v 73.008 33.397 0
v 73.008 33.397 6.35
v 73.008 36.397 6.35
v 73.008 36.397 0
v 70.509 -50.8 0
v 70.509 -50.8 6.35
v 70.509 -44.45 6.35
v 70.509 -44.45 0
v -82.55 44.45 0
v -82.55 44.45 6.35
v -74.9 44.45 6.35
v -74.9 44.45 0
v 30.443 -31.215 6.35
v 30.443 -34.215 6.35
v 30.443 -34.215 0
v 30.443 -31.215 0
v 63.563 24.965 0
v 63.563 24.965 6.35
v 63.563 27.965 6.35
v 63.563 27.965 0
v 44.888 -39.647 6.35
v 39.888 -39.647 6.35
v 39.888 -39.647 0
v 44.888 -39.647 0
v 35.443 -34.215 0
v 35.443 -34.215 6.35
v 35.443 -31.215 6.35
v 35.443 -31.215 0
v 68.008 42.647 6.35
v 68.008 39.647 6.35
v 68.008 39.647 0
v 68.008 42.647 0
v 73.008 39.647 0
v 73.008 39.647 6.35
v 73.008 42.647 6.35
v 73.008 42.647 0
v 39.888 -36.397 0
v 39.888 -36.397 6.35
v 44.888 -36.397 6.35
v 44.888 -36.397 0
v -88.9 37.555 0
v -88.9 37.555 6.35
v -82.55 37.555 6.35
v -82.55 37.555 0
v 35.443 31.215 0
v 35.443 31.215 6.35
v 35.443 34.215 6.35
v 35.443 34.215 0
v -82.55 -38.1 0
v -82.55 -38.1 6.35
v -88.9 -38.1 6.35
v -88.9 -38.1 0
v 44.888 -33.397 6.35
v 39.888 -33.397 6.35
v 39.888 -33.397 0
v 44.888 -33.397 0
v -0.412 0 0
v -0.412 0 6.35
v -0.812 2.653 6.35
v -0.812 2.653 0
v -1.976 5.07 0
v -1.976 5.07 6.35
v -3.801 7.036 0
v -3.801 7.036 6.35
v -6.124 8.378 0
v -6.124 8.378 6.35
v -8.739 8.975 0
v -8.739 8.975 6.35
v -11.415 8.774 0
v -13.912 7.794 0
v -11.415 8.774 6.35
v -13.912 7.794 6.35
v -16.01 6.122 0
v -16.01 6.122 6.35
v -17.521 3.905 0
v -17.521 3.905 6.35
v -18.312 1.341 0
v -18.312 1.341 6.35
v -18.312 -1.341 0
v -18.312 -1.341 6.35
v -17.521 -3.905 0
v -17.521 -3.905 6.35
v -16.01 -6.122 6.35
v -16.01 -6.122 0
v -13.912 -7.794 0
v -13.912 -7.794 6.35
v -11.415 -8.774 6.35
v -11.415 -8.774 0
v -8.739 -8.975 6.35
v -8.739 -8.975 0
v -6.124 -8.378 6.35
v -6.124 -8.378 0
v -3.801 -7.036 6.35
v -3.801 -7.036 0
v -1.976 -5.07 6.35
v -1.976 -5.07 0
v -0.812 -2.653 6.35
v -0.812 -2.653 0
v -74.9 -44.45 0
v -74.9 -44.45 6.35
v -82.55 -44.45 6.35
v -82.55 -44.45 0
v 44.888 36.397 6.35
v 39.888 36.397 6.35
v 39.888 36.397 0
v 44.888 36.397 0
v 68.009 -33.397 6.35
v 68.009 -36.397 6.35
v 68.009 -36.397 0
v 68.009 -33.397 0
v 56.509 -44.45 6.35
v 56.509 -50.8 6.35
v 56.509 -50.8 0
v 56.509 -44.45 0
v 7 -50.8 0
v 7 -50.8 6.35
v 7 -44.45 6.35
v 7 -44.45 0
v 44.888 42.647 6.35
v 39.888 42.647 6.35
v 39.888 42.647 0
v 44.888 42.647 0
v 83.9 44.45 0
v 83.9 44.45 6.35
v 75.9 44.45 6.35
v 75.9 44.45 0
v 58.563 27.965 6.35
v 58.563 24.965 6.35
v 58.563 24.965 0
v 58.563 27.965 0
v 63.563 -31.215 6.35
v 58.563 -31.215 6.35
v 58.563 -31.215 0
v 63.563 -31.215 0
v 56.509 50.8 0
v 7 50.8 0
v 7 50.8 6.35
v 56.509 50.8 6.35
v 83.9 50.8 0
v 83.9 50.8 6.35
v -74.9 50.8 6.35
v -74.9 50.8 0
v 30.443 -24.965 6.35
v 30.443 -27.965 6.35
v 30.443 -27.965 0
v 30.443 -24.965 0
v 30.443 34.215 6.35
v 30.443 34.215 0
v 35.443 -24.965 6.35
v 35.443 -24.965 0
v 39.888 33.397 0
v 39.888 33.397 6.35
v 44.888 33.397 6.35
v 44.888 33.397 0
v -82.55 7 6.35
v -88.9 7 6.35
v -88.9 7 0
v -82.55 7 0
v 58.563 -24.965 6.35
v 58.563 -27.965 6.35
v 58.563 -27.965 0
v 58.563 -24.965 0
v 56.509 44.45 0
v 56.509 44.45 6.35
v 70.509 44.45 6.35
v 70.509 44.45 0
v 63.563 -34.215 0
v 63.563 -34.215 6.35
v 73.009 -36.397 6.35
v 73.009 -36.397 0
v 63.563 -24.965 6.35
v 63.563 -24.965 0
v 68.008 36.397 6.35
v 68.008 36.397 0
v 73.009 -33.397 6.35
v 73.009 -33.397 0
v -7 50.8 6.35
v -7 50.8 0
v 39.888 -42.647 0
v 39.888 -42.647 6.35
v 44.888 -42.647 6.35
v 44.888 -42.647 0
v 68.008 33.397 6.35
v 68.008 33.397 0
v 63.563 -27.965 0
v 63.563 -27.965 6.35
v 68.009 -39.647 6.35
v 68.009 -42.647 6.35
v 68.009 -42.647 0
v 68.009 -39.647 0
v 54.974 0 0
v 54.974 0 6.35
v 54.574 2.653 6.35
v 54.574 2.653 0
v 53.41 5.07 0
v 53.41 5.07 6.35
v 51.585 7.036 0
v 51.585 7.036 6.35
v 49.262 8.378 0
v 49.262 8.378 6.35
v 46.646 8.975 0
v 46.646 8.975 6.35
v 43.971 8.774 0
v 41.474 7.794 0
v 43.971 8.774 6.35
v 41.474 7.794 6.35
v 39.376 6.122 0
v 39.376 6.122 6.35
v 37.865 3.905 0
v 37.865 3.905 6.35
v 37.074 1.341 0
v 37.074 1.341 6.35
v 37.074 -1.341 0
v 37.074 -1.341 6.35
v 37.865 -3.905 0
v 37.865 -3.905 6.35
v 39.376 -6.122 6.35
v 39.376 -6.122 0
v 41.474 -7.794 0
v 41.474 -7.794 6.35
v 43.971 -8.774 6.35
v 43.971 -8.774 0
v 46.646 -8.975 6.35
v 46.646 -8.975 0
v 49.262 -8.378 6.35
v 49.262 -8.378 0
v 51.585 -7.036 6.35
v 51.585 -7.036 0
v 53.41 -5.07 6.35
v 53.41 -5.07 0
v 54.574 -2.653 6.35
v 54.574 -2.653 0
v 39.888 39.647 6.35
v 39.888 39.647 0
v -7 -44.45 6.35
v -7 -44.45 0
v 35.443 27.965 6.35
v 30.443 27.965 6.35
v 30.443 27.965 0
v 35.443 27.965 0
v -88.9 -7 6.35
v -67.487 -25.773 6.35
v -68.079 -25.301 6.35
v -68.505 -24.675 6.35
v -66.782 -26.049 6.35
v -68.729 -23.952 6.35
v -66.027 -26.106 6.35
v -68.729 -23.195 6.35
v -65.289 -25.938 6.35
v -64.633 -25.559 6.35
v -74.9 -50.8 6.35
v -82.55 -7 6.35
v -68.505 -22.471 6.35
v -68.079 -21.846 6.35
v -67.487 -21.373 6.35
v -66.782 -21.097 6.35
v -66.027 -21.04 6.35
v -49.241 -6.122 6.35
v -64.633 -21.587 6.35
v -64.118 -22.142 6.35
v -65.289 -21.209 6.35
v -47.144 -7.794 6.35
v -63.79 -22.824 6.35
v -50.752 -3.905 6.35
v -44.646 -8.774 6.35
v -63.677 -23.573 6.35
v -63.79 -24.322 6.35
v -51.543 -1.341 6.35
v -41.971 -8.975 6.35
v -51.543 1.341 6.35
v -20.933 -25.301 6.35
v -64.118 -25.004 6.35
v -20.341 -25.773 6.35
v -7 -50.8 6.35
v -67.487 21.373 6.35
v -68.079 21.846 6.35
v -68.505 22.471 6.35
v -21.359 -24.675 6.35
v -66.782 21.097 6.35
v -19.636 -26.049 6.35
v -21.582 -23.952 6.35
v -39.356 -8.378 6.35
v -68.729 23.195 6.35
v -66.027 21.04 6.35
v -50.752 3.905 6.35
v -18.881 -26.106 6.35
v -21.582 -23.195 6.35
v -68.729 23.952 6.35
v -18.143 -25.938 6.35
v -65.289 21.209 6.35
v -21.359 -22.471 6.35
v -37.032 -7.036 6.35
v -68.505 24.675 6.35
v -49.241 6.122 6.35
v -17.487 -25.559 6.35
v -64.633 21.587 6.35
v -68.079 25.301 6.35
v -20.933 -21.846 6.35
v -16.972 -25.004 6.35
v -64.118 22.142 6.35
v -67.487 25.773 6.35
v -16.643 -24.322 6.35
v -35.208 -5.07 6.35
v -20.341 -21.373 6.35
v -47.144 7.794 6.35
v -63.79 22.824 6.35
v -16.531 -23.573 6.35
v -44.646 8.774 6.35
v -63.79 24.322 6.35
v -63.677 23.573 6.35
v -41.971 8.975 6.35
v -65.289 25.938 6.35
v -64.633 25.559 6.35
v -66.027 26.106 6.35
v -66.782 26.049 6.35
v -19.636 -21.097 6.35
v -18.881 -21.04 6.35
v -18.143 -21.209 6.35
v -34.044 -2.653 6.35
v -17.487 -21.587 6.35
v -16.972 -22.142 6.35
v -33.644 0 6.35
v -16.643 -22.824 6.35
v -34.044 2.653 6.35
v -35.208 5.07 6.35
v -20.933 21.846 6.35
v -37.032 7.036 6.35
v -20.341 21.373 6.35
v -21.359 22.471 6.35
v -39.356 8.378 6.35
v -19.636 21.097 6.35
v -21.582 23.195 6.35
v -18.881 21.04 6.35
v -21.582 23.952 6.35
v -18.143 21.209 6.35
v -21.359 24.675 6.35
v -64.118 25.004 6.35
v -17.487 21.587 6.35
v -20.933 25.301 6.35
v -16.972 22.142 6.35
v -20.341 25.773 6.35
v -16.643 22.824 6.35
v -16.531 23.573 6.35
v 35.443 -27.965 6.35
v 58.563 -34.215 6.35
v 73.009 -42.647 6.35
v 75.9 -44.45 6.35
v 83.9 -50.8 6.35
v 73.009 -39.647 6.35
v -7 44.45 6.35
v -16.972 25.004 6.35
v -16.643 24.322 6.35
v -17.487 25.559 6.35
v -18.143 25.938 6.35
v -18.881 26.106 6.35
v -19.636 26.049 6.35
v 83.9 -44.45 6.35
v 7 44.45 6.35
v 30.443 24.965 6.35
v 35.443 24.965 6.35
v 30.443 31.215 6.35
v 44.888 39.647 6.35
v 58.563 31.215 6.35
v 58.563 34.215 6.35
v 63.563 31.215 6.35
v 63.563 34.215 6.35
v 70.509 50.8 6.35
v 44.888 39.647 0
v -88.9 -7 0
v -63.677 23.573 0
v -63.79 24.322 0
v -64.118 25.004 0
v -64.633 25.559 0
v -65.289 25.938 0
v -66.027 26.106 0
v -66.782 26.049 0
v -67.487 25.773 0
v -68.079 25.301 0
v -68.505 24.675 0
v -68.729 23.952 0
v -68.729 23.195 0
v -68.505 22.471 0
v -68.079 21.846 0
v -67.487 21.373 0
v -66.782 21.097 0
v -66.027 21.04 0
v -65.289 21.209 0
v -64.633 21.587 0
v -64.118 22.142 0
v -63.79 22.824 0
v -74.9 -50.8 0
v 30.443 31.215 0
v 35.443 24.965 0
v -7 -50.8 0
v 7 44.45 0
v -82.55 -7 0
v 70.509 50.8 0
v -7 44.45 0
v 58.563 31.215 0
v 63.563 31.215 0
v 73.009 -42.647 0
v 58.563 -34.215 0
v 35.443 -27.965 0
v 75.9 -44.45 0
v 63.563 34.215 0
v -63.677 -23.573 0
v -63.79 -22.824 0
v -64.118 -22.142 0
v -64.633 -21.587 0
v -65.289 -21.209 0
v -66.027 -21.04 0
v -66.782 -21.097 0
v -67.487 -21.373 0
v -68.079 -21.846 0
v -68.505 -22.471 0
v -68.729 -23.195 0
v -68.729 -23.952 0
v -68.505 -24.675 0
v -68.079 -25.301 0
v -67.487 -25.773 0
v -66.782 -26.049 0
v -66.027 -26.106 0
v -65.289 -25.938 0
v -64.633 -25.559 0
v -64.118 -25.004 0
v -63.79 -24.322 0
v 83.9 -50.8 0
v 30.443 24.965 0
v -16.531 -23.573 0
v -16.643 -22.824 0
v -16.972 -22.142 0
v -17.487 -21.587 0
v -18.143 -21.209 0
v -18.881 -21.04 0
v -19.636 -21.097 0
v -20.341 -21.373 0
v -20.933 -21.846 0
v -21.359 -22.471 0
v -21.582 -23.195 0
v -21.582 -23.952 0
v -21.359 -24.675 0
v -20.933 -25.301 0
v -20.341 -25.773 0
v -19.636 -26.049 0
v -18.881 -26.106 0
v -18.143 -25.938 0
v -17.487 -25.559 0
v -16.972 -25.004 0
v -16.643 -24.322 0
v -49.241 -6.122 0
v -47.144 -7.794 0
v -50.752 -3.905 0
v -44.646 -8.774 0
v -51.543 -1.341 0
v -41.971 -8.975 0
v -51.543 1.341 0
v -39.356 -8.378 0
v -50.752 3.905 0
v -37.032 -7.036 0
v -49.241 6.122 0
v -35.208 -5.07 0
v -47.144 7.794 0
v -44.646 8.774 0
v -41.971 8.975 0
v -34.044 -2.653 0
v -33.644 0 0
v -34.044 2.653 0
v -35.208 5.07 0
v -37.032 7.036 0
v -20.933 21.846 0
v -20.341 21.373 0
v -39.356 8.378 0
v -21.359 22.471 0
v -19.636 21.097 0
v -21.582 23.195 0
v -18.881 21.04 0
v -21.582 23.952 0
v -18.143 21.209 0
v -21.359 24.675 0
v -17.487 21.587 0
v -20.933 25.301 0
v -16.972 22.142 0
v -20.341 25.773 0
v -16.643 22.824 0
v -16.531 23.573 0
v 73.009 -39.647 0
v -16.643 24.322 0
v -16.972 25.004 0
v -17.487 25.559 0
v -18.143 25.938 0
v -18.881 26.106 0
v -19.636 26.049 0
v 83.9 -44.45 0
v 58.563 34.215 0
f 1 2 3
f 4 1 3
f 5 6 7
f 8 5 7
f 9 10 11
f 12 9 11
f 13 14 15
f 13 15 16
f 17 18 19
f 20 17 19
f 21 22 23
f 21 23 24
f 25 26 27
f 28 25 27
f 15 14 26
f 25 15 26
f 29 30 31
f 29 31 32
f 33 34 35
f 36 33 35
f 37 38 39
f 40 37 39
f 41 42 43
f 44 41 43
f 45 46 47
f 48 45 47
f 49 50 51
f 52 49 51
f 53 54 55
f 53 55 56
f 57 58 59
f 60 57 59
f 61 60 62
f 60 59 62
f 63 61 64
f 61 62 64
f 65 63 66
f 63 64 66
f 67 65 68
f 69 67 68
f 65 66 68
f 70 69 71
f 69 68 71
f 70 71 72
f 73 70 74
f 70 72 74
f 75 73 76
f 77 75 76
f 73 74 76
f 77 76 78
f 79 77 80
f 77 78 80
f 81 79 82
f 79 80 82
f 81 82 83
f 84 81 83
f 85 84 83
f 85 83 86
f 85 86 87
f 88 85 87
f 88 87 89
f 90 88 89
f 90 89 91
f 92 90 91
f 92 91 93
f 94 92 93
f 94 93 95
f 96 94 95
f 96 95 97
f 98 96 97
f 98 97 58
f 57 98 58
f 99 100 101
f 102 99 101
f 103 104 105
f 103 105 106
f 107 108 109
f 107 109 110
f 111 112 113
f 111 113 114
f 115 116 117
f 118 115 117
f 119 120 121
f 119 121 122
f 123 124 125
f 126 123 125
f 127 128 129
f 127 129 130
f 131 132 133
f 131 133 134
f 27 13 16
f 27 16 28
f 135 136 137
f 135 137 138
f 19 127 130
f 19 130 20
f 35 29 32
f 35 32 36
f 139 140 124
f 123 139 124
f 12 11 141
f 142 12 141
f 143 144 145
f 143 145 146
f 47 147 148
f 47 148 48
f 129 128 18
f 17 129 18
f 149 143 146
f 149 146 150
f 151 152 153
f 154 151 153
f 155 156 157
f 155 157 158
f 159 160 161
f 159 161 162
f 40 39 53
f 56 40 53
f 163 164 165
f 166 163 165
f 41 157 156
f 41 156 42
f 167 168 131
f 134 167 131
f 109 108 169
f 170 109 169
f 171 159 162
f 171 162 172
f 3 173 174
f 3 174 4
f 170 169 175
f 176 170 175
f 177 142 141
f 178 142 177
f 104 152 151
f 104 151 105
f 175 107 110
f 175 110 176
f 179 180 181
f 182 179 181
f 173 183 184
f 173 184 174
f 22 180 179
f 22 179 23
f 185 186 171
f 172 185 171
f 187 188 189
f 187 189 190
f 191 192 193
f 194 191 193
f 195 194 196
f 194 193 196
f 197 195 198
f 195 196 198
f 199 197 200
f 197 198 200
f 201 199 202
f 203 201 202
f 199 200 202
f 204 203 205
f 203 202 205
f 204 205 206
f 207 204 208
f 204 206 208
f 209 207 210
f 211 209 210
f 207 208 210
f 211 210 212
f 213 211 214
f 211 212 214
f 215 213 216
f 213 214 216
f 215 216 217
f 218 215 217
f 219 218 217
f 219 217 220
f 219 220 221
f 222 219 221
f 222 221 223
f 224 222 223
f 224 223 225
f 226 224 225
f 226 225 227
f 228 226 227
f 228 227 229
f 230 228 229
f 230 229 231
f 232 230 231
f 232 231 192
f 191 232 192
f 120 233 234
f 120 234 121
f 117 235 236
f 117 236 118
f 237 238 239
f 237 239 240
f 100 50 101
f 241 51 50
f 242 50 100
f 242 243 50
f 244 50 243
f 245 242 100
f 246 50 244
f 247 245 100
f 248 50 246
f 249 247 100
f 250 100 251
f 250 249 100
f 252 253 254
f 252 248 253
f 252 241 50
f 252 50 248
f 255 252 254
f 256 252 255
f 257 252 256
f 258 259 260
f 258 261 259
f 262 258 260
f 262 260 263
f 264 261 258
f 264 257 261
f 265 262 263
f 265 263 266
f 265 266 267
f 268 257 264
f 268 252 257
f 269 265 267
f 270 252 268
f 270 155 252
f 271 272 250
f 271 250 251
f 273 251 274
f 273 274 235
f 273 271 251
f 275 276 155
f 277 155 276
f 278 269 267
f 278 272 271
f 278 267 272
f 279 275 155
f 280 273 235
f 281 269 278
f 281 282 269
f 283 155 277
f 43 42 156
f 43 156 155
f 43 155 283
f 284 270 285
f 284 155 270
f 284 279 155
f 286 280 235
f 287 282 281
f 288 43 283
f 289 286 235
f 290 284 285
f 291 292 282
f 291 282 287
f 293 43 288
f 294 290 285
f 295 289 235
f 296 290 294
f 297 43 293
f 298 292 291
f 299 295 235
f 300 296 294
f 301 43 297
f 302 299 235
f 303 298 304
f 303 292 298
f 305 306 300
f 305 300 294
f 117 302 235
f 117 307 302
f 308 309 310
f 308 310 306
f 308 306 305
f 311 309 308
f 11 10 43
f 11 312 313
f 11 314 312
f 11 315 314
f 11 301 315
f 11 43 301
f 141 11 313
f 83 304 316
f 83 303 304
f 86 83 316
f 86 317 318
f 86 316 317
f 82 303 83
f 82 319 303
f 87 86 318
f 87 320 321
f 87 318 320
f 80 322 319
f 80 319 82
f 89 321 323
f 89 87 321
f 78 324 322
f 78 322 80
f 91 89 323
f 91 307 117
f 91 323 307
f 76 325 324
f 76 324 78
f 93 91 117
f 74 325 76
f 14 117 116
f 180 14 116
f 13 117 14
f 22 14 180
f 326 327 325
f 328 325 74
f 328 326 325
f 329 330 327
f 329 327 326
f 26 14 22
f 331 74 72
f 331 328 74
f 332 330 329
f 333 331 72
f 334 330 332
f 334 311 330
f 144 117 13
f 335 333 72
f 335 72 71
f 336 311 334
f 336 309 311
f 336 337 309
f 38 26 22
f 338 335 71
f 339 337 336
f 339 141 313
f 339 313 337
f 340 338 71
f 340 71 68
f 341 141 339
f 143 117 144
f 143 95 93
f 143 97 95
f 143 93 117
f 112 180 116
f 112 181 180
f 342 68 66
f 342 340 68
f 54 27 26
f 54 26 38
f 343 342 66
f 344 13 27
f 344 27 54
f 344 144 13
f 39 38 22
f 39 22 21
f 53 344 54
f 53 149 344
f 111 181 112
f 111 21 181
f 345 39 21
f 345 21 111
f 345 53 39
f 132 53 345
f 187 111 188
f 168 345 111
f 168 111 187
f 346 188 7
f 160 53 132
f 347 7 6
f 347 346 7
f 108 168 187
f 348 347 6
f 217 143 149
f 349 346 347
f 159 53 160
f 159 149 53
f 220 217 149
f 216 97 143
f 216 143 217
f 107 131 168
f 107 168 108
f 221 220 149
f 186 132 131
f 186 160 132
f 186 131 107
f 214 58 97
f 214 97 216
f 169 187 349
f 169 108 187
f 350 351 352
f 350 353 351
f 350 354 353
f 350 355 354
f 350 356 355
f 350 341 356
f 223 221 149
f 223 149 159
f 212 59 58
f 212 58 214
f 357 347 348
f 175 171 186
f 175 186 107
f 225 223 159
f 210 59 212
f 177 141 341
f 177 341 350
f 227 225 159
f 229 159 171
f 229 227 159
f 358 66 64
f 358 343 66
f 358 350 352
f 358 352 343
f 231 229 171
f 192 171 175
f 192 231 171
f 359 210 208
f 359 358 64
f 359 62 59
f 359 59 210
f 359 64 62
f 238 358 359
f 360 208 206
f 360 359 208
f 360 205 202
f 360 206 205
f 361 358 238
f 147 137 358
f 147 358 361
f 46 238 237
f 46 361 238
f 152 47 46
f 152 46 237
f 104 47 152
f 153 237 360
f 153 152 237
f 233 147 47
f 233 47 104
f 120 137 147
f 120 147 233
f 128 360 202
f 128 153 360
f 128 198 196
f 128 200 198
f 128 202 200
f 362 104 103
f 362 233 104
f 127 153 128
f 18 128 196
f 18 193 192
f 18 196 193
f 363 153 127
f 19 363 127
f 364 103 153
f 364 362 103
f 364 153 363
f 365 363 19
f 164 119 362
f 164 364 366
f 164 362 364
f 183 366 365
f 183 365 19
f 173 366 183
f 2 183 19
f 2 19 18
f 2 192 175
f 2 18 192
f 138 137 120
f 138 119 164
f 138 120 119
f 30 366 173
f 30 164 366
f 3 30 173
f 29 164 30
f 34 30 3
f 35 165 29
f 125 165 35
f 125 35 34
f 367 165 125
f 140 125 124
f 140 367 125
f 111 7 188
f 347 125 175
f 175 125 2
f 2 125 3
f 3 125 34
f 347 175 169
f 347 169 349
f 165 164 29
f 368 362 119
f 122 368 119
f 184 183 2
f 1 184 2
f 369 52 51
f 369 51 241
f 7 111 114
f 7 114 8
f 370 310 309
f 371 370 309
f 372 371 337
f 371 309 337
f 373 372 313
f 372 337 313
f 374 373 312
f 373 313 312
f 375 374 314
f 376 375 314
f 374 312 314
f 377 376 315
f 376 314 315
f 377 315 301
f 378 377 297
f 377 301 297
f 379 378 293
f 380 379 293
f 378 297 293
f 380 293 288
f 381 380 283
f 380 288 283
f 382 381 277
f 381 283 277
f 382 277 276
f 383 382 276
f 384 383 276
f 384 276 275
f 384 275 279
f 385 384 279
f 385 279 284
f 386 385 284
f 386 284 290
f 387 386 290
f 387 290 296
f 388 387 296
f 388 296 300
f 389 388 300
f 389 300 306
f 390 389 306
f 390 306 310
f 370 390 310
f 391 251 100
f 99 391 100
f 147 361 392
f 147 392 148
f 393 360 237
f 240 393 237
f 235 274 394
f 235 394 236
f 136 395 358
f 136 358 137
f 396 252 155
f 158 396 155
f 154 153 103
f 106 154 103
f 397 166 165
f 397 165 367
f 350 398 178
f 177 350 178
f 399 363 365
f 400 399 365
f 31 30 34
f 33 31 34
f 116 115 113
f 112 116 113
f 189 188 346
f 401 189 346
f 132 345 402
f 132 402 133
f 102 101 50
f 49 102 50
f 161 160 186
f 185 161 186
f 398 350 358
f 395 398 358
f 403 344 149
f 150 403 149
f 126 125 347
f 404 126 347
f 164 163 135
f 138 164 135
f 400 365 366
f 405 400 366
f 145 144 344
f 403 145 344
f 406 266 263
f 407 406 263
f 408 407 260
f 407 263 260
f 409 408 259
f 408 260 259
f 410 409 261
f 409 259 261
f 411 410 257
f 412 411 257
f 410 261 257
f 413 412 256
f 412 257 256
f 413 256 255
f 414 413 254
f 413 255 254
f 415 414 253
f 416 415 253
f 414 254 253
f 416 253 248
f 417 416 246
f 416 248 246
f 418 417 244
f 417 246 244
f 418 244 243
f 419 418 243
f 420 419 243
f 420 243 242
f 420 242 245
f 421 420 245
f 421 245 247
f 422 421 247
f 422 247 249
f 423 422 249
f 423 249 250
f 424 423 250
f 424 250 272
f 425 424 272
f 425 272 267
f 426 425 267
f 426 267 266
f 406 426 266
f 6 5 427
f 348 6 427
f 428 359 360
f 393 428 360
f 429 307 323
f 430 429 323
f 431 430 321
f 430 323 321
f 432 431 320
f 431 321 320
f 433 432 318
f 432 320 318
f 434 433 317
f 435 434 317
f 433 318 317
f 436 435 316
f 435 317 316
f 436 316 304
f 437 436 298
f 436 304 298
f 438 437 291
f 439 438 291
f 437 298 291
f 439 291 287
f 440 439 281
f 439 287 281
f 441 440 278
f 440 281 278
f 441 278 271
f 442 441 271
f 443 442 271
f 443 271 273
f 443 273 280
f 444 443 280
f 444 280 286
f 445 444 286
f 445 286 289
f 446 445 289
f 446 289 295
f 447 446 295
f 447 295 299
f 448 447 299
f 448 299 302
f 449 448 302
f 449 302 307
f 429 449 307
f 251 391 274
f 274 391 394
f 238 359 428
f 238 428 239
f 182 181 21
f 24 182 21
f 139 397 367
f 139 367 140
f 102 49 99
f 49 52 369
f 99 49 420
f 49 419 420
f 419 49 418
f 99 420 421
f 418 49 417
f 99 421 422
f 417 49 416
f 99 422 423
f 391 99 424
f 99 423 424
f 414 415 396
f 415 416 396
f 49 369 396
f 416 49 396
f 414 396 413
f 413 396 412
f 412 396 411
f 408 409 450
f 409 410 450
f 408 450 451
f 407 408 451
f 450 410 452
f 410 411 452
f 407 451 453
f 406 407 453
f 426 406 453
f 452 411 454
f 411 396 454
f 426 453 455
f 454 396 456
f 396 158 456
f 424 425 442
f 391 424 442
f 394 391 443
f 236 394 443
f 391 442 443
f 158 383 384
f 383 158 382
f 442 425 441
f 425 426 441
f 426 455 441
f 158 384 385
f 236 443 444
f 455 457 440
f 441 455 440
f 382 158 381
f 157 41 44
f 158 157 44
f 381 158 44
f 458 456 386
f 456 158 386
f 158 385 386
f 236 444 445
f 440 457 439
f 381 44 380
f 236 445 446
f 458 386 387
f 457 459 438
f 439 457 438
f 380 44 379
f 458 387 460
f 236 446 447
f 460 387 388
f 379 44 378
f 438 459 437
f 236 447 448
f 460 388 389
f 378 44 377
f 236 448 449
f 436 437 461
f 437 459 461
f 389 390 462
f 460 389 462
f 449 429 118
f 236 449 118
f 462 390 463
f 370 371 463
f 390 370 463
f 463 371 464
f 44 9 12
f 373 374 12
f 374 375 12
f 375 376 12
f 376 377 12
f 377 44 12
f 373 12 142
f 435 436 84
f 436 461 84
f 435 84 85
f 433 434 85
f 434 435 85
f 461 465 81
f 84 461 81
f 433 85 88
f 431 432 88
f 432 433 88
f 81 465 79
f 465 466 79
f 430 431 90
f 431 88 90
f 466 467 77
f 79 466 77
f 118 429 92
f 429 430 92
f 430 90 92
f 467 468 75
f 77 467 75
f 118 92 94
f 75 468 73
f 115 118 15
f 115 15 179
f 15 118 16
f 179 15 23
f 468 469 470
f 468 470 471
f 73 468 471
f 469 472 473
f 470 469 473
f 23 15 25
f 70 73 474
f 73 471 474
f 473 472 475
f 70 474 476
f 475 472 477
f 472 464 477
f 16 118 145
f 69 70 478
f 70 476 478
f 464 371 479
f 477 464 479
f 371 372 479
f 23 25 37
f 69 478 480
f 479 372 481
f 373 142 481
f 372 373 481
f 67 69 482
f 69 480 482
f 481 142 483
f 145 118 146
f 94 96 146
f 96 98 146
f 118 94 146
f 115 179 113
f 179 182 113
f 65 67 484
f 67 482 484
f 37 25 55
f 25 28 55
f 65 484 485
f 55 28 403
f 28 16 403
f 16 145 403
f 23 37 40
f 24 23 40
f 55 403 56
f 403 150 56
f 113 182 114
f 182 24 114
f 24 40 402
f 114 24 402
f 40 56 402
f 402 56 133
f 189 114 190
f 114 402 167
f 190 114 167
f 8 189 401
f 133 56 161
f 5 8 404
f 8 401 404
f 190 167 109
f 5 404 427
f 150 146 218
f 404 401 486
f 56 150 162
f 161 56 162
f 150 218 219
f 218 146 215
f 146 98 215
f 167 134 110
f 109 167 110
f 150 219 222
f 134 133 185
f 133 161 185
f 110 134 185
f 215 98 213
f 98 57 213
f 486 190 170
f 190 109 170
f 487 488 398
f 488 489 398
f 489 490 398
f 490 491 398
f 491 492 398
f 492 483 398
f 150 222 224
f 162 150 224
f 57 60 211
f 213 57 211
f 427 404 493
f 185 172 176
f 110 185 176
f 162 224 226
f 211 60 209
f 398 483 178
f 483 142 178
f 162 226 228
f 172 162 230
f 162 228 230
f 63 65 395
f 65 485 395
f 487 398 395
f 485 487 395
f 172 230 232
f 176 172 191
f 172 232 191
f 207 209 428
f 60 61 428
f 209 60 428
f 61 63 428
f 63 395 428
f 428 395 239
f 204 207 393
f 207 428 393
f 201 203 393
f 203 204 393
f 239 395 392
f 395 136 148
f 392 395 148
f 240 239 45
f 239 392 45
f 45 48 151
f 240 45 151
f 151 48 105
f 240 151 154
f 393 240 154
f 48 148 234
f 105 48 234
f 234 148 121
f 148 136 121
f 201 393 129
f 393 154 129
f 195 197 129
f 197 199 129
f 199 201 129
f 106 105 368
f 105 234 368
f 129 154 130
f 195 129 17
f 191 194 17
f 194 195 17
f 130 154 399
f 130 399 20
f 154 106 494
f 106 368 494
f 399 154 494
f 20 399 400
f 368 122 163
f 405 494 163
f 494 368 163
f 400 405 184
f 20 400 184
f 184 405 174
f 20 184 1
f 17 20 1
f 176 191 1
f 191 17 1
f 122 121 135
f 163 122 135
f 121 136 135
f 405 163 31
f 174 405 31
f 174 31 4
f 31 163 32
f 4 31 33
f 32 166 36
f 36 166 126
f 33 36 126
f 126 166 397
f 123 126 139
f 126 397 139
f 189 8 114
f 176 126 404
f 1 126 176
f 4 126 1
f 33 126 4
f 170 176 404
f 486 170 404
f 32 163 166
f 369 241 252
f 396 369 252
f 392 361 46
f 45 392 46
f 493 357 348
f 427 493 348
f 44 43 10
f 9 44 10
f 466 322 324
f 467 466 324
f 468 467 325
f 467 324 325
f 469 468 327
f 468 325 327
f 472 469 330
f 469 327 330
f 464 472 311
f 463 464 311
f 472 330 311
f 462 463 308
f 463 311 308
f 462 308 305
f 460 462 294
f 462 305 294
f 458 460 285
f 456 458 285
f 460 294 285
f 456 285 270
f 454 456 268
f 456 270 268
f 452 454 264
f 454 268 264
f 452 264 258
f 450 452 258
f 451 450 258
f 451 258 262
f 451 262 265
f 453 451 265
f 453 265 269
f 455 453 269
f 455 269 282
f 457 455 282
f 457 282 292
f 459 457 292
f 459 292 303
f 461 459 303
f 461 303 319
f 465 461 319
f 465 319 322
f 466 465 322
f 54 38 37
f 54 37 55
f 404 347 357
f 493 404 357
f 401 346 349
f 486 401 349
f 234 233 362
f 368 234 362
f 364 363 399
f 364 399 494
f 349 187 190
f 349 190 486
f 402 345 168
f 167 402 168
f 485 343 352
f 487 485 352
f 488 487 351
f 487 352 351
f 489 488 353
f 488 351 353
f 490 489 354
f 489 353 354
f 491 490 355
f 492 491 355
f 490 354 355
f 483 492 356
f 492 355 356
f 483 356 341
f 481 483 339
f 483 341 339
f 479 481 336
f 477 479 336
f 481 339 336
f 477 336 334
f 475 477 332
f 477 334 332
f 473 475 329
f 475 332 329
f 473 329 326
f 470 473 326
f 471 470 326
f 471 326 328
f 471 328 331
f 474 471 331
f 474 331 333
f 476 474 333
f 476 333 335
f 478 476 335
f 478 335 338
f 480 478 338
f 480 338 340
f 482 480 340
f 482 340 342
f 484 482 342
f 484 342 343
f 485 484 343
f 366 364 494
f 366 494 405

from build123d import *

# Parameters (mm, degrees)
SKETCH2_W           = 177.8
SKETCH2_H           = 101.6
BOSS_EXTRUDE3_DEPTH = 6.35
SKETCH3_R           = 9
SKETCH3_R_2         = 2.54
CUT_EXTRUDE1_DEPTH  = 103.587389576
SKETCH7_W           = 6.35
SKETCH7_H           = 14
SKETCH7_W_2         = 14
SKETCH7_H_2         = 6.35
CUT_EXTRUDE2_DEPTH  = 103.587389576
SKETCH9_W           = 5
SKETCH9_H           = 3
CUT_EXTRUDE3_DEPTH  = 103.587389576


with BuildPart() as part:
    # Sketch2 → Boss-Extrude3 (new body)
    with BuildSketch(Plane.XY):
        Rectangle(SKETCH2_W, SKETCH2_H)
    extrude(amount=BOSS_EXTRUDE3_DEPTH)

    # Sketch3 → Cut-Extrude1 (cut, through all)
    with BuildSketch(Plane.XY.offset(6.35)):
        with Locations((-9.4120506, 0)):
            Circle(SKETCH3_R)
        with Locations((-42.64375, 0)):
            Circle(SKETCH3_R)
        with Locations((-66.216922318, 23.573172318)):
            Circle(SKETCH3_R_2)
        with Locations((-19.070577682, 23.573172318)):
            Circle(SKETCH3_R_2)
        with Locations((-66.216922318, -23.573172318)):
            Circle(SKETCH3_R_2)
        with Locations((-19.070577682, -23.573172318)):
            Circle(SKETCH3_R_2)
        with Locations((45.9739194, 0)):
            Circle(SKETCH3_R)
    extrude(amount=-CUT_EXTRUDE1_DEPTH, mode=Mode.SUBTRACT)

    # Sketch7 → Cut-Extrude2 (cut, through all)
    with BuildSketch(Plane.XY.offset(6.35)):
        with Locations((-85.725, 0)):
            Rectangle(SKETCH7_W, SKETCH7_H)
        Polygon((-74.9, 50.8), (-88.9, 50.8), (-88.9, 37.554527849), (-82.55, 37.554527849), (-82.55, 44.45), (-74.9, 44.45), align=None)
        Polygon((-88.9, -38.1), (-88.9, -50.8), (-74.9, -50.8), (-74.9, -44.45), (-82.55, -44.45), (-82.55, -38.1), align=None)
        with Locations((63.509, 47.625)):
            Rectangle(SKETCH7_W_2, SKETCH7_H_2)
        with Locations((0, 47.625)):
            Rectangle(SKETCH7_W_2, SKETCH7_H_2)
        Polygon((88.9, 50.8), (83.9, 50.8), (83.9, 44.45), (75.9, 44.45), (75.9, -44.45), (83.9, -44.45), (83.9, -50.8), (88.9, -50.8), align=None)
        with Locations((63.509, -47.625)):
            Rectangle(SKETCH7_W_2, SKETCH7_H_2)
        with Locations((0, -47.625)):
            Rectangle(SKETCH7_W_2, SKETCH7_H_2)
    extrude(amount=-CUT_EXTRUDE2_DEPTH, mode=Mode.SUBTRACT)

    # Sketch9 → Cut-Extrude3 (cut, through all)
    with BuildSketch(Plane.XY.offset(6.35)):
        with Locations((61.062890697, 32.715)):
            Rectangle(SKETCH9_W, SKETCH9_H)
        with Locations((32.943445348, 32.715)):
            Rectangle(SKETCH9_W, SKETCH9_H)
        with Locations((61.063445348, -26.465)):
            Rectangle(SKETCH9_W, SKETCH9_H)
        with Locations((61.063445348, -32.715)):
            Rectangle(SKETCH9_W, SKETCH9_H)
        with Locations((32.943445348, -26.465)):
            Rectangle(SKETCH9_W, SKETCH9_H)
        with Locations((32.943445348, -32.715)):
            Rectangle(SKETCH9_W, SKETCH9_H)
        with Locations((70.509, -41.147)):
            Rectangle(SKETCH9_W, SKETCH9_H)
        with Locations((70.508445348, 41.147)):
            Rectangle(SKETCH9_W, SKETCH9_H)
        with Locations((70.508445348, 34.897)):
            Rectangle(SKETCH9_W, SKETCH9_H)
        with Locations((42.388445348, 41.147)):
            Rectangle(SKETCH9_W, SKETCH9_H)
        with Locations((42.388445348, 34.897)):
            Rectangle(SKETCH9_W, SKETCH9_H)
        with Locations((42.388445348, -34.897)):
            Rectangle(SKETCH9_W, SKETCH9_H)
        with Locations((42.388445348, -41.147)):
            Rectangle(SKETCH9_W, SKETCH9_H)
        with Locations((61.062890697, 26.465)):
            Rectangle(SKETCH9_W, SKETCH9_H)
        with Locations((32.943445348, 26.465)):
            Rectangle(SKETCH9_W, SKETCH9_H)
        with Locations((70.509, -34.897)):
            Rectangle(SKETCH9_W, SKETCH9_H)
    extrude(amount=-CUT_EXTRUDE3_DEPTH, mode=Mode.SUBTRACT)


solid = part.part
